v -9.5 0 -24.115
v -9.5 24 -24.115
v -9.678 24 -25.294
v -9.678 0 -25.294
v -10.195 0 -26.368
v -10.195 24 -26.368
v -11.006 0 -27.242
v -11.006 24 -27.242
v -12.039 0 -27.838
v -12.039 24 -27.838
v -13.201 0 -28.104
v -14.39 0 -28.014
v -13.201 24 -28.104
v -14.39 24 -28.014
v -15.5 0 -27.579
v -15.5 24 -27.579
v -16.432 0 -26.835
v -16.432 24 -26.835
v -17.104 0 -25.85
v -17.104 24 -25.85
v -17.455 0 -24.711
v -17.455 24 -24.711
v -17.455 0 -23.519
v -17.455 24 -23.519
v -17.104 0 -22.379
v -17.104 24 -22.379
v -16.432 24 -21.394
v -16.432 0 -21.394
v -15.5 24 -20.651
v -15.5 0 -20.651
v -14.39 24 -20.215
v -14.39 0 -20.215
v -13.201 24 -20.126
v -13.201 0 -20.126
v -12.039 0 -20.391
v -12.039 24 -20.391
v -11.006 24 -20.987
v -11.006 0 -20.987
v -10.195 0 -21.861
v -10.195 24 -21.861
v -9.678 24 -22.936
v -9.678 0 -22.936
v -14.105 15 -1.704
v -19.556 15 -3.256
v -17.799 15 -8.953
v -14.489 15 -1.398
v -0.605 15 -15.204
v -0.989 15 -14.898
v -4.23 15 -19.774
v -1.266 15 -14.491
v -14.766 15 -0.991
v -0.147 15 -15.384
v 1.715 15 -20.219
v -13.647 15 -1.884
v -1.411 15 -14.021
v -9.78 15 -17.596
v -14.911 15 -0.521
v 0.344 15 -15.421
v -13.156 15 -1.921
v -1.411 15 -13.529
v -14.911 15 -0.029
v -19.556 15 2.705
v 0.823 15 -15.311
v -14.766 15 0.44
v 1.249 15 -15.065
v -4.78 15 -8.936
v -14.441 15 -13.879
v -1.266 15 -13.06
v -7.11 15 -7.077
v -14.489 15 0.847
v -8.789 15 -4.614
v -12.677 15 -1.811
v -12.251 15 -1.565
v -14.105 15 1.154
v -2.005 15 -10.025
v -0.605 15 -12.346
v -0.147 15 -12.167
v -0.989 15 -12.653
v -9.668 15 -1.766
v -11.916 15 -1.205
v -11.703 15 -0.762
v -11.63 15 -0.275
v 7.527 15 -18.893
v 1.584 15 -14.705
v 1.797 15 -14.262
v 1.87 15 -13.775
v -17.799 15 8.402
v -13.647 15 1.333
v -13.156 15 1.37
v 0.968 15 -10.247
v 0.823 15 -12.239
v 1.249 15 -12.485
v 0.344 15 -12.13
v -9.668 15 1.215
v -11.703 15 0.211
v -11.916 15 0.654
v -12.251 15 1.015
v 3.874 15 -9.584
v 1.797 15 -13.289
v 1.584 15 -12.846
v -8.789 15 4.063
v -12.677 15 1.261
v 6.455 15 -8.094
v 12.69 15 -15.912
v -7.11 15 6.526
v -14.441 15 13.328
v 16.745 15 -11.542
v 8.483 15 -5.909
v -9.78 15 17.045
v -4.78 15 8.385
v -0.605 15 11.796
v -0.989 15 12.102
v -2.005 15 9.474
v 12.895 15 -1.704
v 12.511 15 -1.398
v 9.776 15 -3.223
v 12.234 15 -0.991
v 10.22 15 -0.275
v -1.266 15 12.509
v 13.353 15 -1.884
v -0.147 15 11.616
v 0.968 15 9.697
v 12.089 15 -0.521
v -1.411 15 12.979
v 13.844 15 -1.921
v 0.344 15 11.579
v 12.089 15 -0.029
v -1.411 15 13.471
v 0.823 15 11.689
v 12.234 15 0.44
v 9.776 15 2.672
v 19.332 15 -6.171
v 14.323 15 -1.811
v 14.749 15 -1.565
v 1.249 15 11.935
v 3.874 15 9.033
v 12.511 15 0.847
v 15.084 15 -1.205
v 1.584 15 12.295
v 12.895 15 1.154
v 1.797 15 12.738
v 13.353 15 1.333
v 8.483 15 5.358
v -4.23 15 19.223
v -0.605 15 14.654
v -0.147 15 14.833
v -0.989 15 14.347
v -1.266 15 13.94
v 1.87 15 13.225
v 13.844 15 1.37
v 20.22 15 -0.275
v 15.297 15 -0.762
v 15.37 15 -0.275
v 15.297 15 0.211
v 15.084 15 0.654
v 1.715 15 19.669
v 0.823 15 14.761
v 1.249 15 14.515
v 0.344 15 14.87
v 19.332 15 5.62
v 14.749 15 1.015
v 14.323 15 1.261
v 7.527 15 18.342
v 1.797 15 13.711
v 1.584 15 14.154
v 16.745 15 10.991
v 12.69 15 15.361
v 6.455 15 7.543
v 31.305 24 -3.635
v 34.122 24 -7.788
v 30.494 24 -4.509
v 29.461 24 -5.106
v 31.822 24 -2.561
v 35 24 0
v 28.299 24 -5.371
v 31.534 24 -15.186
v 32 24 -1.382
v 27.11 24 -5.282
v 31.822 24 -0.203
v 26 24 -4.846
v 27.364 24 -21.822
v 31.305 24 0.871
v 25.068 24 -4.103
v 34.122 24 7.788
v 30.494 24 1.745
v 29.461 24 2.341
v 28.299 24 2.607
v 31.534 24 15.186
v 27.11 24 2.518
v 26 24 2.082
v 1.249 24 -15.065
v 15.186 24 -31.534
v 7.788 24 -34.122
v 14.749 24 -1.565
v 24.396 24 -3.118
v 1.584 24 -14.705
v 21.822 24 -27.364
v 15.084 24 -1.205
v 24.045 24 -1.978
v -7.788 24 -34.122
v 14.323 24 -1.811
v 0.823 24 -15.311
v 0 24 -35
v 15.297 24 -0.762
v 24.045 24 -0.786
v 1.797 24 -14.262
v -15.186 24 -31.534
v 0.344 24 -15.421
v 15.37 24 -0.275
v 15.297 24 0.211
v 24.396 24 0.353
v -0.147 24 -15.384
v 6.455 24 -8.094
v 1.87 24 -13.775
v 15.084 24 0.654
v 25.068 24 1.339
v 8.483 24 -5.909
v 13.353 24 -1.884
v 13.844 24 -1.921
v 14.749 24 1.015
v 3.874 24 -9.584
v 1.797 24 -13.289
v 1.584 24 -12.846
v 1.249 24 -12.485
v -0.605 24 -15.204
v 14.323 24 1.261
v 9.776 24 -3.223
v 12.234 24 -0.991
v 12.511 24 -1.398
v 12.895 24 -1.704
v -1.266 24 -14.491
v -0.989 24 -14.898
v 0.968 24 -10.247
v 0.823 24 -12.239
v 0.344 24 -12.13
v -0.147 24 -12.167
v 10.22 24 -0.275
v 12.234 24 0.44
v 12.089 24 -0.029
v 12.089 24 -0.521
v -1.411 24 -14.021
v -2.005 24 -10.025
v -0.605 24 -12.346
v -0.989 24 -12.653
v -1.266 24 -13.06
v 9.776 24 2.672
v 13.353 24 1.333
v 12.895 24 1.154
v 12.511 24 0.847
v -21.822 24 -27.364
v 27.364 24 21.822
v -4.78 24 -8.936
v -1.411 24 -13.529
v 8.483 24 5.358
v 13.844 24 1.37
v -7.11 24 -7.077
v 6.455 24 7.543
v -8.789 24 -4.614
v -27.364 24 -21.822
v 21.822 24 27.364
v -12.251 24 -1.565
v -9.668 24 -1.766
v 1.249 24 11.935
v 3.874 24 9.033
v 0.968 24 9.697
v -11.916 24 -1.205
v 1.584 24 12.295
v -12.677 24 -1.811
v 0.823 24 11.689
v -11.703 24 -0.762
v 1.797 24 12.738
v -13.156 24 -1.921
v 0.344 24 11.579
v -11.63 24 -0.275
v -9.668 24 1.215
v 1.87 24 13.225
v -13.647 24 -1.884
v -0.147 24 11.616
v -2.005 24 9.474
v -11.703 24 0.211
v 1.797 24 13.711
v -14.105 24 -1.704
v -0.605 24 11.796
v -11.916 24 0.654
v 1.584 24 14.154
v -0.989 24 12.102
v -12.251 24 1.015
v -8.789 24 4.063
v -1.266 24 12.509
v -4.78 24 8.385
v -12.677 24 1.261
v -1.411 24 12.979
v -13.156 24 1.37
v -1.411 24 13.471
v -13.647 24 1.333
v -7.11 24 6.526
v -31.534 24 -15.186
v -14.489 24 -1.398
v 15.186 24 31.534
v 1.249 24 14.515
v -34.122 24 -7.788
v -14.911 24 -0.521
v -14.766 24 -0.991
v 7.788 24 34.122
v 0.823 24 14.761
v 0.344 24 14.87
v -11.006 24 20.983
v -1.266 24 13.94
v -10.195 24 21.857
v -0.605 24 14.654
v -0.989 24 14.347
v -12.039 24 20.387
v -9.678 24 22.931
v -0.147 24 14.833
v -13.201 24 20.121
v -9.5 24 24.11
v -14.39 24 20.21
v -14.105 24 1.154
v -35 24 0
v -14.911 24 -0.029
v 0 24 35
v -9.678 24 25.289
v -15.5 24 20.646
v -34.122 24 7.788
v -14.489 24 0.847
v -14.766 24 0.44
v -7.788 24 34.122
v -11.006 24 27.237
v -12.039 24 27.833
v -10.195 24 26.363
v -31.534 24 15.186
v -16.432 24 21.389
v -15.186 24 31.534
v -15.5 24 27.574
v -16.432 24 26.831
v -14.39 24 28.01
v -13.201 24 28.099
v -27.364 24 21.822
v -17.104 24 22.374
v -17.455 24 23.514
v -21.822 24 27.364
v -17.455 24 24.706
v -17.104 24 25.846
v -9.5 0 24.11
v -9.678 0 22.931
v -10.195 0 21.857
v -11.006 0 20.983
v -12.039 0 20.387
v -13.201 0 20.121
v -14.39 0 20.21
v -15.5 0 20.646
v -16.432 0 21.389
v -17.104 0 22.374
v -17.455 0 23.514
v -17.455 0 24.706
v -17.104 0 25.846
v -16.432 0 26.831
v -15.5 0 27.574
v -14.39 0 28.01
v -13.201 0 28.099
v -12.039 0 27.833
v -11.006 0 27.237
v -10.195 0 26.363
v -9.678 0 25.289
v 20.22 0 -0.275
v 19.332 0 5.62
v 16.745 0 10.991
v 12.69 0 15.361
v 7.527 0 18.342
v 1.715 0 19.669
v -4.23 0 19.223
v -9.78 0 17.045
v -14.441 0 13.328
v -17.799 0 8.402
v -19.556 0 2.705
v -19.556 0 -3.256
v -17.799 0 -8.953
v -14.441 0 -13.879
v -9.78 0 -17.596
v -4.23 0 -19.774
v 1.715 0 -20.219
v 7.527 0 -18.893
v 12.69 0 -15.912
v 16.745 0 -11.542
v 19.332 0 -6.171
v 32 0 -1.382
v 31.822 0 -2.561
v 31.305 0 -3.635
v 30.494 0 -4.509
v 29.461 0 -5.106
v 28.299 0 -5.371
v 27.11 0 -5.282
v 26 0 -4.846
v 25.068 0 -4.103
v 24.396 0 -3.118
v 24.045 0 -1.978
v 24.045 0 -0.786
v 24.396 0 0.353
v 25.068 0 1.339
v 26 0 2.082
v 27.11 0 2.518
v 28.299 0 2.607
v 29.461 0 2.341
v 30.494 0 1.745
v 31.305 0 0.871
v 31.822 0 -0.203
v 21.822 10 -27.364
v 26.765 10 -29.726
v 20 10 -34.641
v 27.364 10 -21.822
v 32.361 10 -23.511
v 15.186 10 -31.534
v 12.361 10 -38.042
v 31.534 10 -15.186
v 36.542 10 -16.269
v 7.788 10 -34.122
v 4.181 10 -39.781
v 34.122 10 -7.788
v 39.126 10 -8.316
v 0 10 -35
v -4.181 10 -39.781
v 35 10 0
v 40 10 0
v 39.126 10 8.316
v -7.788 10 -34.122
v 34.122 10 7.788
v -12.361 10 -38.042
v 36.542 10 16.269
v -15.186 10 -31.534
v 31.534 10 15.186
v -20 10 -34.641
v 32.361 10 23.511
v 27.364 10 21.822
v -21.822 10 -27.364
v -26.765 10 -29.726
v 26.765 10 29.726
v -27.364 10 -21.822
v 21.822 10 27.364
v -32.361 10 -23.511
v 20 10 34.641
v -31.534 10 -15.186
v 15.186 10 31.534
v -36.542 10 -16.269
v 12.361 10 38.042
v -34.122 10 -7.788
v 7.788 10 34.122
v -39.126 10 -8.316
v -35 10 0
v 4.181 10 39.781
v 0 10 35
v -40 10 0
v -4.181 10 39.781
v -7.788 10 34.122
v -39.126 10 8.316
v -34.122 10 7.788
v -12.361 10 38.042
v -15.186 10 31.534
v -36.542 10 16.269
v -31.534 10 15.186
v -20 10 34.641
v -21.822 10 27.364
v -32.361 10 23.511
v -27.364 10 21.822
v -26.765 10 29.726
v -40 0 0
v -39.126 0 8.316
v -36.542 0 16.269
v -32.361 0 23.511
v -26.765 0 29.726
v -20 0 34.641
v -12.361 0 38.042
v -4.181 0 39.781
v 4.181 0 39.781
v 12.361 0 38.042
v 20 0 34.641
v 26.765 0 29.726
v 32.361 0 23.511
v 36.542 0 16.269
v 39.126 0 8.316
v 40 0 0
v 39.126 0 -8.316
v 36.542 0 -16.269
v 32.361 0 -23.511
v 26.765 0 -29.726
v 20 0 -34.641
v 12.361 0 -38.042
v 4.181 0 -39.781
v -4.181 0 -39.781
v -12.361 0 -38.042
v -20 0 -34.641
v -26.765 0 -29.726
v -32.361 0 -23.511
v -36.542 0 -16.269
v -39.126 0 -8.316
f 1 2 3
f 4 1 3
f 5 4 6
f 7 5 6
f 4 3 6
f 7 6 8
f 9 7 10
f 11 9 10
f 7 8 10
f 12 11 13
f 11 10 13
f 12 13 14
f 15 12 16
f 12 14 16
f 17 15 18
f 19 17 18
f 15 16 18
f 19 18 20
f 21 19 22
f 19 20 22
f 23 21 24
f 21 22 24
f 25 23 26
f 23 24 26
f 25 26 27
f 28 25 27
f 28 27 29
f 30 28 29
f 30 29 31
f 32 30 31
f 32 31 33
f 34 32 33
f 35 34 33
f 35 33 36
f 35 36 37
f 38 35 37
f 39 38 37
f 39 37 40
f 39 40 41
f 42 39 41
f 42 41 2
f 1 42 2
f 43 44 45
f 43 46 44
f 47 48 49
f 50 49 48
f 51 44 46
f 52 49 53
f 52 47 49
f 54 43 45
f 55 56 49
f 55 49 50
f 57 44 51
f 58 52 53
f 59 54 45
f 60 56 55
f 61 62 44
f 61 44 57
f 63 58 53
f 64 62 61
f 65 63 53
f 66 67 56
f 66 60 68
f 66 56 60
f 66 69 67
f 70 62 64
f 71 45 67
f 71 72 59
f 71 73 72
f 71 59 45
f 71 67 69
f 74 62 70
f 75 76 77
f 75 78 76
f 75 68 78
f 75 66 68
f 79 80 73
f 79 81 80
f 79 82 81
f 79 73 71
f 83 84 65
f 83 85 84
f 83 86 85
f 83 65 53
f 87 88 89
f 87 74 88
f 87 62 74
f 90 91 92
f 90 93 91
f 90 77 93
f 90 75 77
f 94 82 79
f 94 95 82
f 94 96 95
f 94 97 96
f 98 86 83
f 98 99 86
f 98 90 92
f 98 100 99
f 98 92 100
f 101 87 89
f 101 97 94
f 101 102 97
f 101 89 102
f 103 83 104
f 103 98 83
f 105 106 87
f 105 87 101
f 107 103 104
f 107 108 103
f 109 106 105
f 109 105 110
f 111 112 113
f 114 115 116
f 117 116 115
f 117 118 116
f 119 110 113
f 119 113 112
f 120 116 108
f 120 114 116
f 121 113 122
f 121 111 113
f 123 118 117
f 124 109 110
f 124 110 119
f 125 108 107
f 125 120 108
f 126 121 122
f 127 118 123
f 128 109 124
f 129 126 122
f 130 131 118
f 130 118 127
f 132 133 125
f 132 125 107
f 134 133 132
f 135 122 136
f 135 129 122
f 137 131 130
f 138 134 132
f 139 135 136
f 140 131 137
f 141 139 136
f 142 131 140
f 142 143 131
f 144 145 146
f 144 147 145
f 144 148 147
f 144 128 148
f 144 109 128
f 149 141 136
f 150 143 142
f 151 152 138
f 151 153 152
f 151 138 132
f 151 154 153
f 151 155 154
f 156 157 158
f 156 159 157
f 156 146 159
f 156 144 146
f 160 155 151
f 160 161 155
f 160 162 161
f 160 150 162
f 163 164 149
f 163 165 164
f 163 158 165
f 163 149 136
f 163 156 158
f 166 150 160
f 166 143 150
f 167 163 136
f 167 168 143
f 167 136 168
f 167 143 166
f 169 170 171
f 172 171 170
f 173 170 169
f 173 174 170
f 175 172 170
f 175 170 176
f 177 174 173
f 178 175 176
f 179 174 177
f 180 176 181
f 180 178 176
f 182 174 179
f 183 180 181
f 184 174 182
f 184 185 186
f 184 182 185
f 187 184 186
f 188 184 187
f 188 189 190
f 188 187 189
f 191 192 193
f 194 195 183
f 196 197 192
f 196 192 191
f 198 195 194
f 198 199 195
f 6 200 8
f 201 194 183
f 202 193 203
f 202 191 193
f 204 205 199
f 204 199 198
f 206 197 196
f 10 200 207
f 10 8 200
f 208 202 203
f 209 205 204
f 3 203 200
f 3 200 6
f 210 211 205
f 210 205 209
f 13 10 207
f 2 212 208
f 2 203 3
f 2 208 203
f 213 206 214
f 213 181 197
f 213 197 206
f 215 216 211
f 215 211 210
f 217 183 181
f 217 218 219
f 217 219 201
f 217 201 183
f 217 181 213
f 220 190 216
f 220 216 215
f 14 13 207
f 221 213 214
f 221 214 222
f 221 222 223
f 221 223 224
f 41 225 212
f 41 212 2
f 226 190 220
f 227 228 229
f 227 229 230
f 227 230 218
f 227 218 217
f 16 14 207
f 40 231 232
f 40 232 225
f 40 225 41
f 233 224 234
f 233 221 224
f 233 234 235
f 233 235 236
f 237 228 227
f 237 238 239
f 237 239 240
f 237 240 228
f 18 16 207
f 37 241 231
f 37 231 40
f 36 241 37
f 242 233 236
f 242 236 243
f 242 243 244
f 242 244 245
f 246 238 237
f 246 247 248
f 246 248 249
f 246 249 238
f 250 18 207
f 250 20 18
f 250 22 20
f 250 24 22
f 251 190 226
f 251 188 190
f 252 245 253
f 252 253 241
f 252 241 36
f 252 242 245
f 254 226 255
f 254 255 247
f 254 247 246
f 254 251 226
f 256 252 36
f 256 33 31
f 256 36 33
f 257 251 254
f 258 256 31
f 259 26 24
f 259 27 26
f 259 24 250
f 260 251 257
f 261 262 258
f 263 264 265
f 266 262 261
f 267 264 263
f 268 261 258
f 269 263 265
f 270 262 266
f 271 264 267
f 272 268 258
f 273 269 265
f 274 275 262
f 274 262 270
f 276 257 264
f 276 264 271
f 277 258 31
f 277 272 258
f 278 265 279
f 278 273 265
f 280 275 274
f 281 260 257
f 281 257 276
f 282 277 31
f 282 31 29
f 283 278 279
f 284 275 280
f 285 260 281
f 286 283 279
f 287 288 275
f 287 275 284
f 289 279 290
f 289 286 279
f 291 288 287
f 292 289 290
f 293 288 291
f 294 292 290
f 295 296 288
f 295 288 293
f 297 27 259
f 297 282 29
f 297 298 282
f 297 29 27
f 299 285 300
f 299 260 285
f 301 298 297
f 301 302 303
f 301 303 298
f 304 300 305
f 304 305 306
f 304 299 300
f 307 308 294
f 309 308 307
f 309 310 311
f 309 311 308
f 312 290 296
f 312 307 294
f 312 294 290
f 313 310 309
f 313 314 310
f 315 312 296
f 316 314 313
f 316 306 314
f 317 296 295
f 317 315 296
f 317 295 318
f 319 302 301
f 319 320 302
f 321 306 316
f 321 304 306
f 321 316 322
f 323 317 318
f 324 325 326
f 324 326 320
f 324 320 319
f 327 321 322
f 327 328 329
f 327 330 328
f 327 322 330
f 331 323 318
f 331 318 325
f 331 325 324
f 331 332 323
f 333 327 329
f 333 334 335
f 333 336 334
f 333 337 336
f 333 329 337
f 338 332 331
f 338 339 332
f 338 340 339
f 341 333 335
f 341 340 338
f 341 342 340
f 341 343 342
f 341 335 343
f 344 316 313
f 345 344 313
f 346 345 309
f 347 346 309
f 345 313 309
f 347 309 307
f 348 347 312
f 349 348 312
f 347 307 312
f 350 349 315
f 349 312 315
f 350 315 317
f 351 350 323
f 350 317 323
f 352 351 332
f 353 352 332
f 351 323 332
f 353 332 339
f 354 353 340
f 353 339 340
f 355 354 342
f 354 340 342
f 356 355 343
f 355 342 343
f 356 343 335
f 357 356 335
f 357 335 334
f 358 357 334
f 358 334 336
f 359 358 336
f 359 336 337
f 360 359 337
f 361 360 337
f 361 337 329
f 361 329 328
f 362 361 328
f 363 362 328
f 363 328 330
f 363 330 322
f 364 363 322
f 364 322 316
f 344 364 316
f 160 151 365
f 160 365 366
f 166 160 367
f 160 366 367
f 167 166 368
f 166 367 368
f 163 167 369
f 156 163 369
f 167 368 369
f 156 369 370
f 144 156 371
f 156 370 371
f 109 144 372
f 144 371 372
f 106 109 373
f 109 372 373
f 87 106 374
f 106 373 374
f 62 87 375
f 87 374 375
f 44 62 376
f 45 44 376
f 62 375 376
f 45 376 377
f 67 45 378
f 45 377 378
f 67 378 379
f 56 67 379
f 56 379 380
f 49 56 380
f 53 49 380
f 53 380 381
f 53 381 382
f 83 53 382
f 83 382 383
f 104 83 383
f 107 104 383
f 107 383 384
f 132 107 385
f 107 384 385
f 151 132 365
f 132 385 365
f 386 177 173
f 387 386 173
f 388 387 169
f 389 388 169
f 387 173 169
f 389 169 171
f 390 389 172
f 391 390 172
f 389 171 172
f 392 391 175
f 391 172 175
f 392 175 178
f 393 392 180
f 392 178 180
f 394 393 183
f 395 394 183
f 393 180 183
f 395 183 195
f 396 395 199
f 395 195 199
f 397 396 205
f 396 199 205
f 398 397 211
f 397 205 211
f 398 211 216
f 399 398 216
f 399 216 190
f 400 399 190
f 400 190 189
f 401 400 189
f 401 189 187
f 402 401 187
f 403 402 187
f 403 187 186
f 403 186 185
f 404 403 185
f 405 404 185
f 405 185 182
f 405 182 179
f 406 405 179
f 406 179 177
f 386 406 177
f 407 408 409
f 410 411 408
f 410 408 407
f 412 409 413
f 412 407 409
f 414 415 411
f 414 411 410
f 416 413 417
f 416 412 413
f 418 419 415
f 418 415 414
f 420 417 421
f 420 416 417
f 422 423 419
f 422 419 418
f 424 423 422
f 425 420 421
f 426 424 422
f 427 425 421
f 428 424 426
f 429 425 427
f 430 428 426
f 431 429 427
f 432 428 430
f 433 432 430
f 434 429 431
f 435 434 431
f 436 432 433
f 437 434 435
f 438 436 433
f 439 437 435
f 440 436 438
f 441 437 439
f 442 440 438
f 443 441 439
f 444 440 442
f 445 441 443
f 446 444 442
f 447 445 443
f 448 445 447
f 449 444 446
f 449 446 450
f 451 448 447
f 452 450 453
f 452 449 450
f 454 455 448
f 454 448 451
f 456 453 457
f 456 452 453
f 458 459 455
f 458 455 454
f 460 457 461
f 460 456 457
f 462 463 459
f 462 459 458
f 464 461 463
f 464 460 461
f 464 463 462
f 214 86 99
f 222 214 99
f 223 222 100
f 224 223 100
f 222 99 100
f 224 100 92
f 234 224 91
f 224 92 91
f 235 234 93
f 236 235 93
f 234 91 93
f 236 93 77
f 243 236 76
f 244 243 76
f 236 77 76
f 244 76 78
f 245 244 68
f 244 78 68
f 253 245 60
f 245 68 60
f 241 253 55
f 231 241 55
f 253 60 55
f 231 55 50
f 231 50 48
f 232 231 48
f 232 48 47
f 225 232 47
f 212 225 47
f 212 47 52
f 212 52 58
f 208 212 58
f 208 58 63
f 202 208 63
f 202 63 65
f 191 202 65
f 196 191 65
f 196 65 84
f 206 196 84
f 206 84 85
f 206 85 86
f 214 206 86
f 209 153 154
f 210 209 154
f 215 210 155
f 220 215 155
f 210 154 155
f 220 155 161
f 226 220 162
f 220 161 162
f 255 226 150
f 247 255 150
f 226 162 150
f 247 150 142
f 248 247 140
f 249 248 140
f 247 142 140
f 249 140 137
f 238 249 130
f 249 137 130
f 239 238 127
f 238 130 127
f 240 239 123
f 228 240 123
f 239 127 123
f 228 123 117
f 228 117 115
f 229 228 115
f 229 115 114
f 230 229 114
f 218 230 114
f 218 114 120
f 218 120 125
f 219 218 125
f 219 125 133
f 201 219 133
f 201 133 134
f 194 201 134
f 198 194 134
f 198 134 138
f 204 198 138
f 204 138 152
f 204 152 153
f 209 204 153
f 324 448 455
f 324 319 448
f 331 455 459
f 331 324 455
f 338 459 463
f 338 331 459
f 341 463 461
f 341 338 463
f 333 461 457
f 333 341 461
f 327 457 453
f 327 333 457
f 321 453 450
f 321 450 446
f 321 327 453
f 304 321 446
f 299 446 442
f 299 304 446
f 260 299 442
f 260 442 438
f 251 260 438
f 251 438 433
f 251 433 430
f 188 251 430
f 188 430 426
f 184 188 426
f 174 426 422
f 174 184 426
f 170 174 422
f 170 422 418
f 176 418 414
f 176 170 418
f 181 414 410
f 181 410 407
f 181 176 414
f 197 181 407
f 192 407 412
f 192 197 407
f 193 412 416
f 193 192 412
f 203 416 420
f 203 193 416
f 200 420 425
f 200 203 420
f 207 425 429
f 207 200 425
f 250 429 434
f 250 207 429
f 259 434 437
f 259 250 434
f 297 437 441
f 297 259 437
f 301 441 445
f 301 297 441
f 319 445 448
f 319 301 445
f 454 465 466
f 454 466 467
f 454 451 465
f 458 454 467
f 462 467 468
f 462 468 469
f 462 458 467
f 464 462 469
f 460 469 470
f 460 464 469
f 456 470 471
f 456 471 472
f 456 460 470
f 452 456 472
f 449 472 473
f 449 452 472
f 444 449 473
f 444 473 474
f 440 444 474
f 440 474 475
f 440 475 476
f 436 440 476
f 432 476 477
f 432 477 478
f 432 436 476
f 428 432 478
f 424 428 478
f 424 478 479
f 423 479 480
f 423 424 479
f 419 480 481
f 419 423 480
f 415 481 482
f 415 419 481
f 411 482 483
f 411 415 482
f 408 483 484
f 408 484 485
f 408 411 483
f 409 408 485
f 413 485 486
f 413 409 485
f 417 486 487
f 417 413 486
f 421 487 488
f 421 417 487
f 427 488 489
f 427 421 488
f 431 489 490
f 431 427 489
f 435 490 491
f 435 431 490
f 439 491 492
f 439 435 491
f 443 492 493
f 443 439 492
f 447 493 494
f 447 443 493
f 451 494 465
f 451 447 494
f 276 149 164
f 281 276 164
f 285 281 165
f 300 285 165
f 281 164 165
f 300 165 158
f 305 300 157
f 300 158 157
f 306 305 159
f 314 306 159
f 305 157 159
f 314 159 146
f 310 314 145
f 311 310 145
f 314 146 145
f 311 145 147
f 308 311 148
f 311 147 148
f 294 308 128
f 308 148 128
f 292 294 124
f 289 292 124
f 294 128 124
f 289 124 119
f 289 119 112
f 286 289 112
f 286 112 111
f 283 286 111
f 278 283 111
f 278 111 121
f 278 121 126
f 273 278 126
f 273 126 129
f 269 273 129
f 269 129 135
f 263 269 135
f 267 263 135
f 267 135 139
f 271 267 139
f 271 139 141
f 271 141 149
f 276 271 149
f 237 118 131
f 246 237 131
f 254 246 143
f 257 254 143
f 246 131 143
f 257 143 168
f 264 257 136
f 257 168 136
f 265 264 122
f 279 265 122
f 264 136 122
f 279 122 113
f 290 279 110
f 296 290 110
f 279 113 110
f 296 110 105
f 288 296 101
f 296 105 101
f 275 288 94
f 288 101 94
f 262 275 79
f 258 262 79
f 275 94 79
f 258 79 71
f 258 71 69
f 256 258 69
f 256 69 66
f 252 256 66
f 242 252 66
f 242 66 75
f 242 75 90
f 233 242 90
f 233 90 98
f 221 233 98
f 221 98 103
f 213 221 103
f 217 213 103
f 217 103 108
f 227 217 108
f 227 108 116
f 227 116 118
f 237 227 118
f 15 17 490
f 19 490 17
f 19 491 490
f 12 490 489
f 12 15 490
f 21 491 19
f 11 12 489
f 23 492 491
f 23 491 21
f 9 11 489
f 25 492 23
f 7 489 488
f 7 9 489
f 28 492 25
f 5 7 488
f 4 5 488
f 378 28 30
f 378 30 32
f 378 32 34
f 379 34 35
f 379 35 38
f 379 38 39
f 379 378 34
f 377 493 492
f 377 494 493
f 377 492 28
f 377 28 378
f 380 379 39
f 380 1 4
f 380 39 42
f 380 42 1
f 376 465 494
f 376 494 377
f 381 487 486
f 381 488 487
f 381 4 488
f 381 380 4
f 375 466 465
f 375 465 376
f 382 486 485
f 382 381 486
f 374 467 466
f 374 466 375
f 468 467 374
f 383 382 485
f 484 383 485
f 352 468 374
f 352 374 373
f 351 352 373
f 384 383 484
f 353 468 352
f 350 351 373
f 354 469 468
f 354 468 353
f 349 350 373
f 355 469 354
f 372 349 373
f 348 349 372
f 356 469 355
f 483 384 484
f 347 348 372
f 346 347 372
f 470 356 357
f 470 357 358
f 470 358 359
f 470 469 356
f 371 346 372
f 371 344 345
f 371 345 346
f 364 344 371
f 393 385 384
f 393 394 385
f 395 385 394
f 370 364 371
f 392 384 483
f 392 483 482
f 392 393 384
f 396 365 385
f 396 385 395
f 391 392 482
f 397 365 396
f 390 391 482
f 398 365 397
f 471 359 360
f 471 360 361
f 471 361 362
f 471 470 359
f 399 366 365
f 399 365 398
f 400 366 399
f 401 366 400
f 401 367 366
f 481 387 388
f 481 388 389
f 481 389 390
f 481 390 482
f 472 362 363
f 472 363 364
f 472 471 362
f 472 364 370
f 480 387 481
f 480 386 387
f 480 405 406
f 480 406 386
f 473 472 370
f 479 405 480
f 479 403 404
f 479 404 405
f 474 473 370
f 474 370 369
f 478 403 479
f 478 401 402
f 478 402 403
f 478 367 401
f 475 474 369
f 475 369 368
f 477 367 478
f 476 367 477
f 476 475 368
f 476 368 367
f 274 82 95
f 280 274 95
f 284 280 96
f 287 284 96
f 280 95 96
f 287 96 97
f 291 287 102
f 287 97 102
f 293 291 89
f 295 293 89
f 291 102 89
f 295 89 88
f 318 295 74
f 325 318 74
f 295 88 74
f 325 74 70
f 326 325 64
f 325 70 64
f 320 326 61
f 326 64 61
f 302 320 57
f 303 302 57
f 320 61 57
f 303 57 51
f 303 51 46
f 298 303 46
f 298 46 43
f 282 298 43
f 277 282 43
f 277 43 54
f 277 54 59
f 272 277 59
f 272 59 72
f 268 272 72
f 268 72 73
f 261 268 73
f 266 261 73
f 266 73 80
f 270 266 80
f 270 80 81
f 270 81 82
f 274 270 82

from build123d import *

# Parameters (mm, degrees)
SKETCH2_R               = 10
SKETCH2_R_2             = 1.65
CUT_EXTRUDE2_DEPTH      = 1
CUT_EXTRUDE2_DEPTH_BACK = 25
SKETCH2_5_R             = 20
SKETCH2_5_R_2           = 1.65
SKETCH2_5_R_3           = 10
CUT_EXTRUDE3_DEPTH      = 15
SKETCH3_R               = 4
CUT_EXTRUDE4_DEPTH      = 1
CUT_EXTRUDE4_DEPTH_BACK = 25


with BuildPart() as part:
    # Sketch1 → Revolve1 (revolve)
    with BuildSketch(Plane.XY):
        Polygon((-40, 10), (-35, 10), (-35, 24), (0, 24), (0, 0), (-40, 0), align=None)
    revolve(axis=Axis((0, -1000, 0), (0, 1, 0)))

    # Sketch2 → Cut-Extrude2 (cut, two sides)
    with BuildSketch(Plane.XZ) as cut_extrude2_sk:
        with Locations((0.220332098, -0.275415123)):
            Circle(SKETCH2_R)
        with Locations((13.720332098, -0.275415123)):
            Circle(SKETCH2_R_2)
        with Locations((0.220332098, -13.775415123)):
            Circle(SKETCH2_R_2)
        with Locations((-13.279667902, -0.275415123)):
            Circle(SKETCH2_R_2)
        with Locations((0.220332098, 13.224584877)):
            Circle(SKETCH2_R_2)
    extrude(amount=CUT_EXTRUDE2_DEPTH, mode=Mode.SUBTRACT)
    extrude(cut_extrude2_sk.sketch, amount=-CUT_EXTRUDE2_DEPTH_BACK, mode=Mode.SUBTRACT)

    # Sketch2<5> → Cut-Extrude3 (cut)
    with BuildSketch(Plane.XZ):
        with Locations((0.220332098, -0.275415123)):
            Circle(SKETCH2_5_R)
        with Locations((0.220332098, -13.775415123)):
            Circle(SKETCH2_5_R_2, mode=Mode.SUBTRACT)
        with Locations((13.720332098, -0.275415123)):
            Circle(SKETCH2_5_R_2, mode=Mode.SUBTRACT)
        with Locations((0.220332098, -0.275415123)):
            Circle(SKETCH2_5_R_3, mode=Mode.SUBTRACT)
        with Locations((-13.279667902, -0.275415123)):
            Circle(SKETCH2_5_R_2, mode=Mode.SUBTRACT)
        with Locations((0.220332098, 13.224584877)):
            Circle(SKETCH2_5_R_2, mode=Mode.SUBTRACT)
    extrude(amount=-CUT_EXTRUDE3_DEPTH, mode=Mode.SUBTRACT)

    # Sketch3 → Cut-Extrude4 (cut, two sides)
    with BuildSketch(Plane(origin=(0, 24, 0), x_dir=(1, 0, 0), z_dir=(0, 1, 0))) as cut_extrude4_sk:
        with Locations((28, 1.382050236)):
            Circle(SKETCH3_R)
        with Locations((-13.5, -24.11)):
            Circle(SKETCH3_R)
        with Locations((-13.5, 24.11473671)):
            Circle(SKETCH3_R)
    extrude(amount=CUT_EXTRUDE4_DEPTH, mode=Mode.SUBTRACT)
    extrude(cut_extrude4_sk.sketch, amount=-CUT_EXTRUDE4_DEPTH_BACK, mode=Mode.SUBTRACT)


solid = part.part
